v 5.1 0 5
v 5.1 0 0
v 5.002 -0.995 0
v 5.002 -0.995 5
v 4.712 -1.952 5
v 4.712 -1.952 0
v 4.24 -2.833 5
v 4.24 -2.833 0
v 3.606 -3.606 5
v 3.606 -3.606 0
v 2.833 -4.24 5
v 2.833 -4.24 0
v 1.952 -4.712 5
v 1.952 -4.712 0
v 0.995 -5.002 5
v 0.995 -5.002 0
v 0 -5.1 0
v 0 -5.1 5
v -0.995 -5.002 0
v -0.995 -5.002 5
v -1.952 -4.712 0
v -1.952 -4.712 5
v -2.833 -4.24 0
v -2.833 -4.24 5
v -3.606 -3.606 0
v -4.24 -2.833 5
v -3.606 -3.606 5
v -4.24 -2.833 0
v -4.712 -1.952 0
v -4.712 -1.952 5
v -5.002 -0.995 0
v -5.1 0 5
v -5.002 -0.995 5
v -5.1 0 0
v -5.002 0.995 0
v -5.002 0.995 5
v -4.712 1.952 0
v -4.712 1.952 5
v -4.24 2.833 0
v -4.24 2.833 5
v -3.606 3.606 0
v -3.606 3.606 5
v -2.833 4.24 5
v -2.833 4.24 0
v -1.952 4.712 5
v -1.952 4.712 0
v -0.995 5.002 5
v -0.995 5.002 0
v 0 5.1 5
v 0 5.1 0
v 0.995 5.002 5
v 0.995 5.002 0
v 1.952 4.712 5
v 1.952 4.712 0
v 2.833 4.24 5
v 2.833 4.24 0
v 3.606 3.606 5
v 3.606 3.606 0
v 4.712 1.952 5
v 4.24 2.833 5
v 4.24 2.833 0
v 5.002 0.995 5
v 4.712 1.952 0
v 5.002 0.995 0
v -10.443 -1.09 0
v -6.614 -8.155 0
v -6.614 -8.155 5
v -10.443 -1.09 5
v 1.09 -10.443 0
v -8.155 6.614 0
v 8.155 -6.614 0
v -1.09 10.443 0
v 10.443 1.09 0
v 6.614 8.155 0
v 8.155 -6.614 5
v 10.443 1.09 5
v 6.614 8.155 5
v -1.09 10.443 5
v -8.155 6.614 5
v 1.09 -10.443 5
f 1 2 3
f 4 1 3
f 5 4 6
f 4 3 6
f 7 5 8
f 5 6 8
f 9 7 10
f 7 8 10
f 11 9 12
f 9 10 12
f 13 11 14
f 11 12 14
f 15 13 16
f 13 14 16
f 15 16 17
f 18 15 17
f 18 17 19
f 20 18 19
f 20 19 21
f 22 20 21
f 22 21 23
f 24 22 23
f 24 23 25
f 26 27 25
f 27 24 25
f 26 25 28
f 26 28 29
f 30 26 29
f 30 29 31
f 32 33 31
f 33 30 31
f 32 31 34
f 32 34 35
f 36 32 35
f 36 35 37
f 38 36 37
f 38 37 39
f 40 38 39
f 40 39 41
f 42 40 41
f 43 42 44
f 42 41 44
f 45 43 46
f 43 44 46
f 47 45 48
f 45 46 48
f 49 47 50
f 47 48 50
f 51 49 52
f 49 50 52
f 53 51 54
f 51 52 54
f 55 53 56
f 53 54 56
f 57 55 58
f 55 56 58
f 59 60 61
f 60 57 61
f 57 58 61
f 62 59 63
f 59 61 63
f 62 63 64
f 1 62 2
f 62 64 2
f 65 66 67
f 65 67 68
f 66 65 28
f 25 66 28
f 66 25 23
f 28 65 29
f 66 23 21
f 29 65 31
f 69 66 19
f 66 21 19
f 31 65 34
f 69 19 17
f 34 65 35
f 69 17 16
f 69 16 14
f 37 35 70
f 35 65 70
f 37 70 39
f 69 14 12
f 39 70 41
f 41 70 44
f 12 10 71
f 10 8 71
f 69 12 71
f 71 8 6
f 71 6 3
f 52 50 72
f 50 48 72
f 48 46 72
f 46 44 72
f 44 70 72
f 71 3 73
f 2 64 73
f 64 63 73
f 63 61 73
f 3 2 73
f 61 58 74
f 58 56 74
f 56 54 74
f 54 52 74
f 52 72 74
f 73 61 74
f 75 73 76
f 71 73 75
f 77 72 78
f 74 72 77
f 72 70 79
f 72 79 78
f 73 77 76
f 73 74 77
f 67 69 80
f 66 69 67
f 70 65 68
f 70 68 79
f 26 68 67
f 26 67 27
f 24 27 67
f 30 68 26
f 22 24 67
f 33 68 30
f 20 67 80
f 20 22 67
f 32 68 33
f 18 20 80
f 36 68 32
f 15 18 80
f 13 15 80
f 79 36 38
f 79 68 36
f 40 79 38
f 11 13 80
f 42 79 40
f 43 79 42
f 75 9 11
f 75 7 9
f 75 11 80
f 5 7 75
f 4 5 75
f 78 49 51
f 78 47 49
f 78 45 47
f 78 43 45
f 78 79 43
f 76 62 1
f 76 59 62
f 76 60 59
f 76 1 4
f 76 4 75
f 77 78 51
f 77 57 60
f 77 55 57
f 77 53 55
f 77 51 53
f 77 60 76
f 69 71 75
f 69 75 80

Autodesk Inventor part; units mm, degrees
ref_plane "YZ Plane" through (0, 0, 0) normal (1, 0, 0) x (0, 1, 0)
ref_plane "XZ Plane" through (0, 0, 0) normal (0, 1, 0) x (-1, 0, 0)
ref_plane "XY Plane" through (0, 0, 0) normal (0, 0, 1) x (1, 0, 0)
sketch "Boceto1" plane through (0, 0, 0) normal (0, 0, 1) x (1, 0, 0)
  circle A0 centre (0, 0) radius 10.5
  line L0 (8.1551, -6.614) -> (1.0897, -10.4433)
  line L1 (1.0897, -10.4433) -> (-6.614, -8.1551)
  line L2 (-6.614, -8.1551) -> (-10.4433, -1.0897)
  line L3 (-10.4433, -1.0897) -> (-8.1551, 6.614)
  line L4 (-8.1551, 6.614) -> (-1.0897, 10.4433)
  line L5 (-1.0897, 10.4433) -> (6.614, 8.1551)
  line L6 (6.614, 8.1551) -> (10.4433, 1.0897)
  line L7 (10.4433, 1.0897) -> (8.1551, -6.614)
  circle A1 centre (0, 0) radius 5.1
  dimension "d1" = 21
  dimension "d2" = 10.2
extrude "Extrusión1" add sketch "Boceto1" along normal blind 5 contours L7 L0 L1 L2 L3 L4 L5 L6
properties part number "TuercaLlanta"
